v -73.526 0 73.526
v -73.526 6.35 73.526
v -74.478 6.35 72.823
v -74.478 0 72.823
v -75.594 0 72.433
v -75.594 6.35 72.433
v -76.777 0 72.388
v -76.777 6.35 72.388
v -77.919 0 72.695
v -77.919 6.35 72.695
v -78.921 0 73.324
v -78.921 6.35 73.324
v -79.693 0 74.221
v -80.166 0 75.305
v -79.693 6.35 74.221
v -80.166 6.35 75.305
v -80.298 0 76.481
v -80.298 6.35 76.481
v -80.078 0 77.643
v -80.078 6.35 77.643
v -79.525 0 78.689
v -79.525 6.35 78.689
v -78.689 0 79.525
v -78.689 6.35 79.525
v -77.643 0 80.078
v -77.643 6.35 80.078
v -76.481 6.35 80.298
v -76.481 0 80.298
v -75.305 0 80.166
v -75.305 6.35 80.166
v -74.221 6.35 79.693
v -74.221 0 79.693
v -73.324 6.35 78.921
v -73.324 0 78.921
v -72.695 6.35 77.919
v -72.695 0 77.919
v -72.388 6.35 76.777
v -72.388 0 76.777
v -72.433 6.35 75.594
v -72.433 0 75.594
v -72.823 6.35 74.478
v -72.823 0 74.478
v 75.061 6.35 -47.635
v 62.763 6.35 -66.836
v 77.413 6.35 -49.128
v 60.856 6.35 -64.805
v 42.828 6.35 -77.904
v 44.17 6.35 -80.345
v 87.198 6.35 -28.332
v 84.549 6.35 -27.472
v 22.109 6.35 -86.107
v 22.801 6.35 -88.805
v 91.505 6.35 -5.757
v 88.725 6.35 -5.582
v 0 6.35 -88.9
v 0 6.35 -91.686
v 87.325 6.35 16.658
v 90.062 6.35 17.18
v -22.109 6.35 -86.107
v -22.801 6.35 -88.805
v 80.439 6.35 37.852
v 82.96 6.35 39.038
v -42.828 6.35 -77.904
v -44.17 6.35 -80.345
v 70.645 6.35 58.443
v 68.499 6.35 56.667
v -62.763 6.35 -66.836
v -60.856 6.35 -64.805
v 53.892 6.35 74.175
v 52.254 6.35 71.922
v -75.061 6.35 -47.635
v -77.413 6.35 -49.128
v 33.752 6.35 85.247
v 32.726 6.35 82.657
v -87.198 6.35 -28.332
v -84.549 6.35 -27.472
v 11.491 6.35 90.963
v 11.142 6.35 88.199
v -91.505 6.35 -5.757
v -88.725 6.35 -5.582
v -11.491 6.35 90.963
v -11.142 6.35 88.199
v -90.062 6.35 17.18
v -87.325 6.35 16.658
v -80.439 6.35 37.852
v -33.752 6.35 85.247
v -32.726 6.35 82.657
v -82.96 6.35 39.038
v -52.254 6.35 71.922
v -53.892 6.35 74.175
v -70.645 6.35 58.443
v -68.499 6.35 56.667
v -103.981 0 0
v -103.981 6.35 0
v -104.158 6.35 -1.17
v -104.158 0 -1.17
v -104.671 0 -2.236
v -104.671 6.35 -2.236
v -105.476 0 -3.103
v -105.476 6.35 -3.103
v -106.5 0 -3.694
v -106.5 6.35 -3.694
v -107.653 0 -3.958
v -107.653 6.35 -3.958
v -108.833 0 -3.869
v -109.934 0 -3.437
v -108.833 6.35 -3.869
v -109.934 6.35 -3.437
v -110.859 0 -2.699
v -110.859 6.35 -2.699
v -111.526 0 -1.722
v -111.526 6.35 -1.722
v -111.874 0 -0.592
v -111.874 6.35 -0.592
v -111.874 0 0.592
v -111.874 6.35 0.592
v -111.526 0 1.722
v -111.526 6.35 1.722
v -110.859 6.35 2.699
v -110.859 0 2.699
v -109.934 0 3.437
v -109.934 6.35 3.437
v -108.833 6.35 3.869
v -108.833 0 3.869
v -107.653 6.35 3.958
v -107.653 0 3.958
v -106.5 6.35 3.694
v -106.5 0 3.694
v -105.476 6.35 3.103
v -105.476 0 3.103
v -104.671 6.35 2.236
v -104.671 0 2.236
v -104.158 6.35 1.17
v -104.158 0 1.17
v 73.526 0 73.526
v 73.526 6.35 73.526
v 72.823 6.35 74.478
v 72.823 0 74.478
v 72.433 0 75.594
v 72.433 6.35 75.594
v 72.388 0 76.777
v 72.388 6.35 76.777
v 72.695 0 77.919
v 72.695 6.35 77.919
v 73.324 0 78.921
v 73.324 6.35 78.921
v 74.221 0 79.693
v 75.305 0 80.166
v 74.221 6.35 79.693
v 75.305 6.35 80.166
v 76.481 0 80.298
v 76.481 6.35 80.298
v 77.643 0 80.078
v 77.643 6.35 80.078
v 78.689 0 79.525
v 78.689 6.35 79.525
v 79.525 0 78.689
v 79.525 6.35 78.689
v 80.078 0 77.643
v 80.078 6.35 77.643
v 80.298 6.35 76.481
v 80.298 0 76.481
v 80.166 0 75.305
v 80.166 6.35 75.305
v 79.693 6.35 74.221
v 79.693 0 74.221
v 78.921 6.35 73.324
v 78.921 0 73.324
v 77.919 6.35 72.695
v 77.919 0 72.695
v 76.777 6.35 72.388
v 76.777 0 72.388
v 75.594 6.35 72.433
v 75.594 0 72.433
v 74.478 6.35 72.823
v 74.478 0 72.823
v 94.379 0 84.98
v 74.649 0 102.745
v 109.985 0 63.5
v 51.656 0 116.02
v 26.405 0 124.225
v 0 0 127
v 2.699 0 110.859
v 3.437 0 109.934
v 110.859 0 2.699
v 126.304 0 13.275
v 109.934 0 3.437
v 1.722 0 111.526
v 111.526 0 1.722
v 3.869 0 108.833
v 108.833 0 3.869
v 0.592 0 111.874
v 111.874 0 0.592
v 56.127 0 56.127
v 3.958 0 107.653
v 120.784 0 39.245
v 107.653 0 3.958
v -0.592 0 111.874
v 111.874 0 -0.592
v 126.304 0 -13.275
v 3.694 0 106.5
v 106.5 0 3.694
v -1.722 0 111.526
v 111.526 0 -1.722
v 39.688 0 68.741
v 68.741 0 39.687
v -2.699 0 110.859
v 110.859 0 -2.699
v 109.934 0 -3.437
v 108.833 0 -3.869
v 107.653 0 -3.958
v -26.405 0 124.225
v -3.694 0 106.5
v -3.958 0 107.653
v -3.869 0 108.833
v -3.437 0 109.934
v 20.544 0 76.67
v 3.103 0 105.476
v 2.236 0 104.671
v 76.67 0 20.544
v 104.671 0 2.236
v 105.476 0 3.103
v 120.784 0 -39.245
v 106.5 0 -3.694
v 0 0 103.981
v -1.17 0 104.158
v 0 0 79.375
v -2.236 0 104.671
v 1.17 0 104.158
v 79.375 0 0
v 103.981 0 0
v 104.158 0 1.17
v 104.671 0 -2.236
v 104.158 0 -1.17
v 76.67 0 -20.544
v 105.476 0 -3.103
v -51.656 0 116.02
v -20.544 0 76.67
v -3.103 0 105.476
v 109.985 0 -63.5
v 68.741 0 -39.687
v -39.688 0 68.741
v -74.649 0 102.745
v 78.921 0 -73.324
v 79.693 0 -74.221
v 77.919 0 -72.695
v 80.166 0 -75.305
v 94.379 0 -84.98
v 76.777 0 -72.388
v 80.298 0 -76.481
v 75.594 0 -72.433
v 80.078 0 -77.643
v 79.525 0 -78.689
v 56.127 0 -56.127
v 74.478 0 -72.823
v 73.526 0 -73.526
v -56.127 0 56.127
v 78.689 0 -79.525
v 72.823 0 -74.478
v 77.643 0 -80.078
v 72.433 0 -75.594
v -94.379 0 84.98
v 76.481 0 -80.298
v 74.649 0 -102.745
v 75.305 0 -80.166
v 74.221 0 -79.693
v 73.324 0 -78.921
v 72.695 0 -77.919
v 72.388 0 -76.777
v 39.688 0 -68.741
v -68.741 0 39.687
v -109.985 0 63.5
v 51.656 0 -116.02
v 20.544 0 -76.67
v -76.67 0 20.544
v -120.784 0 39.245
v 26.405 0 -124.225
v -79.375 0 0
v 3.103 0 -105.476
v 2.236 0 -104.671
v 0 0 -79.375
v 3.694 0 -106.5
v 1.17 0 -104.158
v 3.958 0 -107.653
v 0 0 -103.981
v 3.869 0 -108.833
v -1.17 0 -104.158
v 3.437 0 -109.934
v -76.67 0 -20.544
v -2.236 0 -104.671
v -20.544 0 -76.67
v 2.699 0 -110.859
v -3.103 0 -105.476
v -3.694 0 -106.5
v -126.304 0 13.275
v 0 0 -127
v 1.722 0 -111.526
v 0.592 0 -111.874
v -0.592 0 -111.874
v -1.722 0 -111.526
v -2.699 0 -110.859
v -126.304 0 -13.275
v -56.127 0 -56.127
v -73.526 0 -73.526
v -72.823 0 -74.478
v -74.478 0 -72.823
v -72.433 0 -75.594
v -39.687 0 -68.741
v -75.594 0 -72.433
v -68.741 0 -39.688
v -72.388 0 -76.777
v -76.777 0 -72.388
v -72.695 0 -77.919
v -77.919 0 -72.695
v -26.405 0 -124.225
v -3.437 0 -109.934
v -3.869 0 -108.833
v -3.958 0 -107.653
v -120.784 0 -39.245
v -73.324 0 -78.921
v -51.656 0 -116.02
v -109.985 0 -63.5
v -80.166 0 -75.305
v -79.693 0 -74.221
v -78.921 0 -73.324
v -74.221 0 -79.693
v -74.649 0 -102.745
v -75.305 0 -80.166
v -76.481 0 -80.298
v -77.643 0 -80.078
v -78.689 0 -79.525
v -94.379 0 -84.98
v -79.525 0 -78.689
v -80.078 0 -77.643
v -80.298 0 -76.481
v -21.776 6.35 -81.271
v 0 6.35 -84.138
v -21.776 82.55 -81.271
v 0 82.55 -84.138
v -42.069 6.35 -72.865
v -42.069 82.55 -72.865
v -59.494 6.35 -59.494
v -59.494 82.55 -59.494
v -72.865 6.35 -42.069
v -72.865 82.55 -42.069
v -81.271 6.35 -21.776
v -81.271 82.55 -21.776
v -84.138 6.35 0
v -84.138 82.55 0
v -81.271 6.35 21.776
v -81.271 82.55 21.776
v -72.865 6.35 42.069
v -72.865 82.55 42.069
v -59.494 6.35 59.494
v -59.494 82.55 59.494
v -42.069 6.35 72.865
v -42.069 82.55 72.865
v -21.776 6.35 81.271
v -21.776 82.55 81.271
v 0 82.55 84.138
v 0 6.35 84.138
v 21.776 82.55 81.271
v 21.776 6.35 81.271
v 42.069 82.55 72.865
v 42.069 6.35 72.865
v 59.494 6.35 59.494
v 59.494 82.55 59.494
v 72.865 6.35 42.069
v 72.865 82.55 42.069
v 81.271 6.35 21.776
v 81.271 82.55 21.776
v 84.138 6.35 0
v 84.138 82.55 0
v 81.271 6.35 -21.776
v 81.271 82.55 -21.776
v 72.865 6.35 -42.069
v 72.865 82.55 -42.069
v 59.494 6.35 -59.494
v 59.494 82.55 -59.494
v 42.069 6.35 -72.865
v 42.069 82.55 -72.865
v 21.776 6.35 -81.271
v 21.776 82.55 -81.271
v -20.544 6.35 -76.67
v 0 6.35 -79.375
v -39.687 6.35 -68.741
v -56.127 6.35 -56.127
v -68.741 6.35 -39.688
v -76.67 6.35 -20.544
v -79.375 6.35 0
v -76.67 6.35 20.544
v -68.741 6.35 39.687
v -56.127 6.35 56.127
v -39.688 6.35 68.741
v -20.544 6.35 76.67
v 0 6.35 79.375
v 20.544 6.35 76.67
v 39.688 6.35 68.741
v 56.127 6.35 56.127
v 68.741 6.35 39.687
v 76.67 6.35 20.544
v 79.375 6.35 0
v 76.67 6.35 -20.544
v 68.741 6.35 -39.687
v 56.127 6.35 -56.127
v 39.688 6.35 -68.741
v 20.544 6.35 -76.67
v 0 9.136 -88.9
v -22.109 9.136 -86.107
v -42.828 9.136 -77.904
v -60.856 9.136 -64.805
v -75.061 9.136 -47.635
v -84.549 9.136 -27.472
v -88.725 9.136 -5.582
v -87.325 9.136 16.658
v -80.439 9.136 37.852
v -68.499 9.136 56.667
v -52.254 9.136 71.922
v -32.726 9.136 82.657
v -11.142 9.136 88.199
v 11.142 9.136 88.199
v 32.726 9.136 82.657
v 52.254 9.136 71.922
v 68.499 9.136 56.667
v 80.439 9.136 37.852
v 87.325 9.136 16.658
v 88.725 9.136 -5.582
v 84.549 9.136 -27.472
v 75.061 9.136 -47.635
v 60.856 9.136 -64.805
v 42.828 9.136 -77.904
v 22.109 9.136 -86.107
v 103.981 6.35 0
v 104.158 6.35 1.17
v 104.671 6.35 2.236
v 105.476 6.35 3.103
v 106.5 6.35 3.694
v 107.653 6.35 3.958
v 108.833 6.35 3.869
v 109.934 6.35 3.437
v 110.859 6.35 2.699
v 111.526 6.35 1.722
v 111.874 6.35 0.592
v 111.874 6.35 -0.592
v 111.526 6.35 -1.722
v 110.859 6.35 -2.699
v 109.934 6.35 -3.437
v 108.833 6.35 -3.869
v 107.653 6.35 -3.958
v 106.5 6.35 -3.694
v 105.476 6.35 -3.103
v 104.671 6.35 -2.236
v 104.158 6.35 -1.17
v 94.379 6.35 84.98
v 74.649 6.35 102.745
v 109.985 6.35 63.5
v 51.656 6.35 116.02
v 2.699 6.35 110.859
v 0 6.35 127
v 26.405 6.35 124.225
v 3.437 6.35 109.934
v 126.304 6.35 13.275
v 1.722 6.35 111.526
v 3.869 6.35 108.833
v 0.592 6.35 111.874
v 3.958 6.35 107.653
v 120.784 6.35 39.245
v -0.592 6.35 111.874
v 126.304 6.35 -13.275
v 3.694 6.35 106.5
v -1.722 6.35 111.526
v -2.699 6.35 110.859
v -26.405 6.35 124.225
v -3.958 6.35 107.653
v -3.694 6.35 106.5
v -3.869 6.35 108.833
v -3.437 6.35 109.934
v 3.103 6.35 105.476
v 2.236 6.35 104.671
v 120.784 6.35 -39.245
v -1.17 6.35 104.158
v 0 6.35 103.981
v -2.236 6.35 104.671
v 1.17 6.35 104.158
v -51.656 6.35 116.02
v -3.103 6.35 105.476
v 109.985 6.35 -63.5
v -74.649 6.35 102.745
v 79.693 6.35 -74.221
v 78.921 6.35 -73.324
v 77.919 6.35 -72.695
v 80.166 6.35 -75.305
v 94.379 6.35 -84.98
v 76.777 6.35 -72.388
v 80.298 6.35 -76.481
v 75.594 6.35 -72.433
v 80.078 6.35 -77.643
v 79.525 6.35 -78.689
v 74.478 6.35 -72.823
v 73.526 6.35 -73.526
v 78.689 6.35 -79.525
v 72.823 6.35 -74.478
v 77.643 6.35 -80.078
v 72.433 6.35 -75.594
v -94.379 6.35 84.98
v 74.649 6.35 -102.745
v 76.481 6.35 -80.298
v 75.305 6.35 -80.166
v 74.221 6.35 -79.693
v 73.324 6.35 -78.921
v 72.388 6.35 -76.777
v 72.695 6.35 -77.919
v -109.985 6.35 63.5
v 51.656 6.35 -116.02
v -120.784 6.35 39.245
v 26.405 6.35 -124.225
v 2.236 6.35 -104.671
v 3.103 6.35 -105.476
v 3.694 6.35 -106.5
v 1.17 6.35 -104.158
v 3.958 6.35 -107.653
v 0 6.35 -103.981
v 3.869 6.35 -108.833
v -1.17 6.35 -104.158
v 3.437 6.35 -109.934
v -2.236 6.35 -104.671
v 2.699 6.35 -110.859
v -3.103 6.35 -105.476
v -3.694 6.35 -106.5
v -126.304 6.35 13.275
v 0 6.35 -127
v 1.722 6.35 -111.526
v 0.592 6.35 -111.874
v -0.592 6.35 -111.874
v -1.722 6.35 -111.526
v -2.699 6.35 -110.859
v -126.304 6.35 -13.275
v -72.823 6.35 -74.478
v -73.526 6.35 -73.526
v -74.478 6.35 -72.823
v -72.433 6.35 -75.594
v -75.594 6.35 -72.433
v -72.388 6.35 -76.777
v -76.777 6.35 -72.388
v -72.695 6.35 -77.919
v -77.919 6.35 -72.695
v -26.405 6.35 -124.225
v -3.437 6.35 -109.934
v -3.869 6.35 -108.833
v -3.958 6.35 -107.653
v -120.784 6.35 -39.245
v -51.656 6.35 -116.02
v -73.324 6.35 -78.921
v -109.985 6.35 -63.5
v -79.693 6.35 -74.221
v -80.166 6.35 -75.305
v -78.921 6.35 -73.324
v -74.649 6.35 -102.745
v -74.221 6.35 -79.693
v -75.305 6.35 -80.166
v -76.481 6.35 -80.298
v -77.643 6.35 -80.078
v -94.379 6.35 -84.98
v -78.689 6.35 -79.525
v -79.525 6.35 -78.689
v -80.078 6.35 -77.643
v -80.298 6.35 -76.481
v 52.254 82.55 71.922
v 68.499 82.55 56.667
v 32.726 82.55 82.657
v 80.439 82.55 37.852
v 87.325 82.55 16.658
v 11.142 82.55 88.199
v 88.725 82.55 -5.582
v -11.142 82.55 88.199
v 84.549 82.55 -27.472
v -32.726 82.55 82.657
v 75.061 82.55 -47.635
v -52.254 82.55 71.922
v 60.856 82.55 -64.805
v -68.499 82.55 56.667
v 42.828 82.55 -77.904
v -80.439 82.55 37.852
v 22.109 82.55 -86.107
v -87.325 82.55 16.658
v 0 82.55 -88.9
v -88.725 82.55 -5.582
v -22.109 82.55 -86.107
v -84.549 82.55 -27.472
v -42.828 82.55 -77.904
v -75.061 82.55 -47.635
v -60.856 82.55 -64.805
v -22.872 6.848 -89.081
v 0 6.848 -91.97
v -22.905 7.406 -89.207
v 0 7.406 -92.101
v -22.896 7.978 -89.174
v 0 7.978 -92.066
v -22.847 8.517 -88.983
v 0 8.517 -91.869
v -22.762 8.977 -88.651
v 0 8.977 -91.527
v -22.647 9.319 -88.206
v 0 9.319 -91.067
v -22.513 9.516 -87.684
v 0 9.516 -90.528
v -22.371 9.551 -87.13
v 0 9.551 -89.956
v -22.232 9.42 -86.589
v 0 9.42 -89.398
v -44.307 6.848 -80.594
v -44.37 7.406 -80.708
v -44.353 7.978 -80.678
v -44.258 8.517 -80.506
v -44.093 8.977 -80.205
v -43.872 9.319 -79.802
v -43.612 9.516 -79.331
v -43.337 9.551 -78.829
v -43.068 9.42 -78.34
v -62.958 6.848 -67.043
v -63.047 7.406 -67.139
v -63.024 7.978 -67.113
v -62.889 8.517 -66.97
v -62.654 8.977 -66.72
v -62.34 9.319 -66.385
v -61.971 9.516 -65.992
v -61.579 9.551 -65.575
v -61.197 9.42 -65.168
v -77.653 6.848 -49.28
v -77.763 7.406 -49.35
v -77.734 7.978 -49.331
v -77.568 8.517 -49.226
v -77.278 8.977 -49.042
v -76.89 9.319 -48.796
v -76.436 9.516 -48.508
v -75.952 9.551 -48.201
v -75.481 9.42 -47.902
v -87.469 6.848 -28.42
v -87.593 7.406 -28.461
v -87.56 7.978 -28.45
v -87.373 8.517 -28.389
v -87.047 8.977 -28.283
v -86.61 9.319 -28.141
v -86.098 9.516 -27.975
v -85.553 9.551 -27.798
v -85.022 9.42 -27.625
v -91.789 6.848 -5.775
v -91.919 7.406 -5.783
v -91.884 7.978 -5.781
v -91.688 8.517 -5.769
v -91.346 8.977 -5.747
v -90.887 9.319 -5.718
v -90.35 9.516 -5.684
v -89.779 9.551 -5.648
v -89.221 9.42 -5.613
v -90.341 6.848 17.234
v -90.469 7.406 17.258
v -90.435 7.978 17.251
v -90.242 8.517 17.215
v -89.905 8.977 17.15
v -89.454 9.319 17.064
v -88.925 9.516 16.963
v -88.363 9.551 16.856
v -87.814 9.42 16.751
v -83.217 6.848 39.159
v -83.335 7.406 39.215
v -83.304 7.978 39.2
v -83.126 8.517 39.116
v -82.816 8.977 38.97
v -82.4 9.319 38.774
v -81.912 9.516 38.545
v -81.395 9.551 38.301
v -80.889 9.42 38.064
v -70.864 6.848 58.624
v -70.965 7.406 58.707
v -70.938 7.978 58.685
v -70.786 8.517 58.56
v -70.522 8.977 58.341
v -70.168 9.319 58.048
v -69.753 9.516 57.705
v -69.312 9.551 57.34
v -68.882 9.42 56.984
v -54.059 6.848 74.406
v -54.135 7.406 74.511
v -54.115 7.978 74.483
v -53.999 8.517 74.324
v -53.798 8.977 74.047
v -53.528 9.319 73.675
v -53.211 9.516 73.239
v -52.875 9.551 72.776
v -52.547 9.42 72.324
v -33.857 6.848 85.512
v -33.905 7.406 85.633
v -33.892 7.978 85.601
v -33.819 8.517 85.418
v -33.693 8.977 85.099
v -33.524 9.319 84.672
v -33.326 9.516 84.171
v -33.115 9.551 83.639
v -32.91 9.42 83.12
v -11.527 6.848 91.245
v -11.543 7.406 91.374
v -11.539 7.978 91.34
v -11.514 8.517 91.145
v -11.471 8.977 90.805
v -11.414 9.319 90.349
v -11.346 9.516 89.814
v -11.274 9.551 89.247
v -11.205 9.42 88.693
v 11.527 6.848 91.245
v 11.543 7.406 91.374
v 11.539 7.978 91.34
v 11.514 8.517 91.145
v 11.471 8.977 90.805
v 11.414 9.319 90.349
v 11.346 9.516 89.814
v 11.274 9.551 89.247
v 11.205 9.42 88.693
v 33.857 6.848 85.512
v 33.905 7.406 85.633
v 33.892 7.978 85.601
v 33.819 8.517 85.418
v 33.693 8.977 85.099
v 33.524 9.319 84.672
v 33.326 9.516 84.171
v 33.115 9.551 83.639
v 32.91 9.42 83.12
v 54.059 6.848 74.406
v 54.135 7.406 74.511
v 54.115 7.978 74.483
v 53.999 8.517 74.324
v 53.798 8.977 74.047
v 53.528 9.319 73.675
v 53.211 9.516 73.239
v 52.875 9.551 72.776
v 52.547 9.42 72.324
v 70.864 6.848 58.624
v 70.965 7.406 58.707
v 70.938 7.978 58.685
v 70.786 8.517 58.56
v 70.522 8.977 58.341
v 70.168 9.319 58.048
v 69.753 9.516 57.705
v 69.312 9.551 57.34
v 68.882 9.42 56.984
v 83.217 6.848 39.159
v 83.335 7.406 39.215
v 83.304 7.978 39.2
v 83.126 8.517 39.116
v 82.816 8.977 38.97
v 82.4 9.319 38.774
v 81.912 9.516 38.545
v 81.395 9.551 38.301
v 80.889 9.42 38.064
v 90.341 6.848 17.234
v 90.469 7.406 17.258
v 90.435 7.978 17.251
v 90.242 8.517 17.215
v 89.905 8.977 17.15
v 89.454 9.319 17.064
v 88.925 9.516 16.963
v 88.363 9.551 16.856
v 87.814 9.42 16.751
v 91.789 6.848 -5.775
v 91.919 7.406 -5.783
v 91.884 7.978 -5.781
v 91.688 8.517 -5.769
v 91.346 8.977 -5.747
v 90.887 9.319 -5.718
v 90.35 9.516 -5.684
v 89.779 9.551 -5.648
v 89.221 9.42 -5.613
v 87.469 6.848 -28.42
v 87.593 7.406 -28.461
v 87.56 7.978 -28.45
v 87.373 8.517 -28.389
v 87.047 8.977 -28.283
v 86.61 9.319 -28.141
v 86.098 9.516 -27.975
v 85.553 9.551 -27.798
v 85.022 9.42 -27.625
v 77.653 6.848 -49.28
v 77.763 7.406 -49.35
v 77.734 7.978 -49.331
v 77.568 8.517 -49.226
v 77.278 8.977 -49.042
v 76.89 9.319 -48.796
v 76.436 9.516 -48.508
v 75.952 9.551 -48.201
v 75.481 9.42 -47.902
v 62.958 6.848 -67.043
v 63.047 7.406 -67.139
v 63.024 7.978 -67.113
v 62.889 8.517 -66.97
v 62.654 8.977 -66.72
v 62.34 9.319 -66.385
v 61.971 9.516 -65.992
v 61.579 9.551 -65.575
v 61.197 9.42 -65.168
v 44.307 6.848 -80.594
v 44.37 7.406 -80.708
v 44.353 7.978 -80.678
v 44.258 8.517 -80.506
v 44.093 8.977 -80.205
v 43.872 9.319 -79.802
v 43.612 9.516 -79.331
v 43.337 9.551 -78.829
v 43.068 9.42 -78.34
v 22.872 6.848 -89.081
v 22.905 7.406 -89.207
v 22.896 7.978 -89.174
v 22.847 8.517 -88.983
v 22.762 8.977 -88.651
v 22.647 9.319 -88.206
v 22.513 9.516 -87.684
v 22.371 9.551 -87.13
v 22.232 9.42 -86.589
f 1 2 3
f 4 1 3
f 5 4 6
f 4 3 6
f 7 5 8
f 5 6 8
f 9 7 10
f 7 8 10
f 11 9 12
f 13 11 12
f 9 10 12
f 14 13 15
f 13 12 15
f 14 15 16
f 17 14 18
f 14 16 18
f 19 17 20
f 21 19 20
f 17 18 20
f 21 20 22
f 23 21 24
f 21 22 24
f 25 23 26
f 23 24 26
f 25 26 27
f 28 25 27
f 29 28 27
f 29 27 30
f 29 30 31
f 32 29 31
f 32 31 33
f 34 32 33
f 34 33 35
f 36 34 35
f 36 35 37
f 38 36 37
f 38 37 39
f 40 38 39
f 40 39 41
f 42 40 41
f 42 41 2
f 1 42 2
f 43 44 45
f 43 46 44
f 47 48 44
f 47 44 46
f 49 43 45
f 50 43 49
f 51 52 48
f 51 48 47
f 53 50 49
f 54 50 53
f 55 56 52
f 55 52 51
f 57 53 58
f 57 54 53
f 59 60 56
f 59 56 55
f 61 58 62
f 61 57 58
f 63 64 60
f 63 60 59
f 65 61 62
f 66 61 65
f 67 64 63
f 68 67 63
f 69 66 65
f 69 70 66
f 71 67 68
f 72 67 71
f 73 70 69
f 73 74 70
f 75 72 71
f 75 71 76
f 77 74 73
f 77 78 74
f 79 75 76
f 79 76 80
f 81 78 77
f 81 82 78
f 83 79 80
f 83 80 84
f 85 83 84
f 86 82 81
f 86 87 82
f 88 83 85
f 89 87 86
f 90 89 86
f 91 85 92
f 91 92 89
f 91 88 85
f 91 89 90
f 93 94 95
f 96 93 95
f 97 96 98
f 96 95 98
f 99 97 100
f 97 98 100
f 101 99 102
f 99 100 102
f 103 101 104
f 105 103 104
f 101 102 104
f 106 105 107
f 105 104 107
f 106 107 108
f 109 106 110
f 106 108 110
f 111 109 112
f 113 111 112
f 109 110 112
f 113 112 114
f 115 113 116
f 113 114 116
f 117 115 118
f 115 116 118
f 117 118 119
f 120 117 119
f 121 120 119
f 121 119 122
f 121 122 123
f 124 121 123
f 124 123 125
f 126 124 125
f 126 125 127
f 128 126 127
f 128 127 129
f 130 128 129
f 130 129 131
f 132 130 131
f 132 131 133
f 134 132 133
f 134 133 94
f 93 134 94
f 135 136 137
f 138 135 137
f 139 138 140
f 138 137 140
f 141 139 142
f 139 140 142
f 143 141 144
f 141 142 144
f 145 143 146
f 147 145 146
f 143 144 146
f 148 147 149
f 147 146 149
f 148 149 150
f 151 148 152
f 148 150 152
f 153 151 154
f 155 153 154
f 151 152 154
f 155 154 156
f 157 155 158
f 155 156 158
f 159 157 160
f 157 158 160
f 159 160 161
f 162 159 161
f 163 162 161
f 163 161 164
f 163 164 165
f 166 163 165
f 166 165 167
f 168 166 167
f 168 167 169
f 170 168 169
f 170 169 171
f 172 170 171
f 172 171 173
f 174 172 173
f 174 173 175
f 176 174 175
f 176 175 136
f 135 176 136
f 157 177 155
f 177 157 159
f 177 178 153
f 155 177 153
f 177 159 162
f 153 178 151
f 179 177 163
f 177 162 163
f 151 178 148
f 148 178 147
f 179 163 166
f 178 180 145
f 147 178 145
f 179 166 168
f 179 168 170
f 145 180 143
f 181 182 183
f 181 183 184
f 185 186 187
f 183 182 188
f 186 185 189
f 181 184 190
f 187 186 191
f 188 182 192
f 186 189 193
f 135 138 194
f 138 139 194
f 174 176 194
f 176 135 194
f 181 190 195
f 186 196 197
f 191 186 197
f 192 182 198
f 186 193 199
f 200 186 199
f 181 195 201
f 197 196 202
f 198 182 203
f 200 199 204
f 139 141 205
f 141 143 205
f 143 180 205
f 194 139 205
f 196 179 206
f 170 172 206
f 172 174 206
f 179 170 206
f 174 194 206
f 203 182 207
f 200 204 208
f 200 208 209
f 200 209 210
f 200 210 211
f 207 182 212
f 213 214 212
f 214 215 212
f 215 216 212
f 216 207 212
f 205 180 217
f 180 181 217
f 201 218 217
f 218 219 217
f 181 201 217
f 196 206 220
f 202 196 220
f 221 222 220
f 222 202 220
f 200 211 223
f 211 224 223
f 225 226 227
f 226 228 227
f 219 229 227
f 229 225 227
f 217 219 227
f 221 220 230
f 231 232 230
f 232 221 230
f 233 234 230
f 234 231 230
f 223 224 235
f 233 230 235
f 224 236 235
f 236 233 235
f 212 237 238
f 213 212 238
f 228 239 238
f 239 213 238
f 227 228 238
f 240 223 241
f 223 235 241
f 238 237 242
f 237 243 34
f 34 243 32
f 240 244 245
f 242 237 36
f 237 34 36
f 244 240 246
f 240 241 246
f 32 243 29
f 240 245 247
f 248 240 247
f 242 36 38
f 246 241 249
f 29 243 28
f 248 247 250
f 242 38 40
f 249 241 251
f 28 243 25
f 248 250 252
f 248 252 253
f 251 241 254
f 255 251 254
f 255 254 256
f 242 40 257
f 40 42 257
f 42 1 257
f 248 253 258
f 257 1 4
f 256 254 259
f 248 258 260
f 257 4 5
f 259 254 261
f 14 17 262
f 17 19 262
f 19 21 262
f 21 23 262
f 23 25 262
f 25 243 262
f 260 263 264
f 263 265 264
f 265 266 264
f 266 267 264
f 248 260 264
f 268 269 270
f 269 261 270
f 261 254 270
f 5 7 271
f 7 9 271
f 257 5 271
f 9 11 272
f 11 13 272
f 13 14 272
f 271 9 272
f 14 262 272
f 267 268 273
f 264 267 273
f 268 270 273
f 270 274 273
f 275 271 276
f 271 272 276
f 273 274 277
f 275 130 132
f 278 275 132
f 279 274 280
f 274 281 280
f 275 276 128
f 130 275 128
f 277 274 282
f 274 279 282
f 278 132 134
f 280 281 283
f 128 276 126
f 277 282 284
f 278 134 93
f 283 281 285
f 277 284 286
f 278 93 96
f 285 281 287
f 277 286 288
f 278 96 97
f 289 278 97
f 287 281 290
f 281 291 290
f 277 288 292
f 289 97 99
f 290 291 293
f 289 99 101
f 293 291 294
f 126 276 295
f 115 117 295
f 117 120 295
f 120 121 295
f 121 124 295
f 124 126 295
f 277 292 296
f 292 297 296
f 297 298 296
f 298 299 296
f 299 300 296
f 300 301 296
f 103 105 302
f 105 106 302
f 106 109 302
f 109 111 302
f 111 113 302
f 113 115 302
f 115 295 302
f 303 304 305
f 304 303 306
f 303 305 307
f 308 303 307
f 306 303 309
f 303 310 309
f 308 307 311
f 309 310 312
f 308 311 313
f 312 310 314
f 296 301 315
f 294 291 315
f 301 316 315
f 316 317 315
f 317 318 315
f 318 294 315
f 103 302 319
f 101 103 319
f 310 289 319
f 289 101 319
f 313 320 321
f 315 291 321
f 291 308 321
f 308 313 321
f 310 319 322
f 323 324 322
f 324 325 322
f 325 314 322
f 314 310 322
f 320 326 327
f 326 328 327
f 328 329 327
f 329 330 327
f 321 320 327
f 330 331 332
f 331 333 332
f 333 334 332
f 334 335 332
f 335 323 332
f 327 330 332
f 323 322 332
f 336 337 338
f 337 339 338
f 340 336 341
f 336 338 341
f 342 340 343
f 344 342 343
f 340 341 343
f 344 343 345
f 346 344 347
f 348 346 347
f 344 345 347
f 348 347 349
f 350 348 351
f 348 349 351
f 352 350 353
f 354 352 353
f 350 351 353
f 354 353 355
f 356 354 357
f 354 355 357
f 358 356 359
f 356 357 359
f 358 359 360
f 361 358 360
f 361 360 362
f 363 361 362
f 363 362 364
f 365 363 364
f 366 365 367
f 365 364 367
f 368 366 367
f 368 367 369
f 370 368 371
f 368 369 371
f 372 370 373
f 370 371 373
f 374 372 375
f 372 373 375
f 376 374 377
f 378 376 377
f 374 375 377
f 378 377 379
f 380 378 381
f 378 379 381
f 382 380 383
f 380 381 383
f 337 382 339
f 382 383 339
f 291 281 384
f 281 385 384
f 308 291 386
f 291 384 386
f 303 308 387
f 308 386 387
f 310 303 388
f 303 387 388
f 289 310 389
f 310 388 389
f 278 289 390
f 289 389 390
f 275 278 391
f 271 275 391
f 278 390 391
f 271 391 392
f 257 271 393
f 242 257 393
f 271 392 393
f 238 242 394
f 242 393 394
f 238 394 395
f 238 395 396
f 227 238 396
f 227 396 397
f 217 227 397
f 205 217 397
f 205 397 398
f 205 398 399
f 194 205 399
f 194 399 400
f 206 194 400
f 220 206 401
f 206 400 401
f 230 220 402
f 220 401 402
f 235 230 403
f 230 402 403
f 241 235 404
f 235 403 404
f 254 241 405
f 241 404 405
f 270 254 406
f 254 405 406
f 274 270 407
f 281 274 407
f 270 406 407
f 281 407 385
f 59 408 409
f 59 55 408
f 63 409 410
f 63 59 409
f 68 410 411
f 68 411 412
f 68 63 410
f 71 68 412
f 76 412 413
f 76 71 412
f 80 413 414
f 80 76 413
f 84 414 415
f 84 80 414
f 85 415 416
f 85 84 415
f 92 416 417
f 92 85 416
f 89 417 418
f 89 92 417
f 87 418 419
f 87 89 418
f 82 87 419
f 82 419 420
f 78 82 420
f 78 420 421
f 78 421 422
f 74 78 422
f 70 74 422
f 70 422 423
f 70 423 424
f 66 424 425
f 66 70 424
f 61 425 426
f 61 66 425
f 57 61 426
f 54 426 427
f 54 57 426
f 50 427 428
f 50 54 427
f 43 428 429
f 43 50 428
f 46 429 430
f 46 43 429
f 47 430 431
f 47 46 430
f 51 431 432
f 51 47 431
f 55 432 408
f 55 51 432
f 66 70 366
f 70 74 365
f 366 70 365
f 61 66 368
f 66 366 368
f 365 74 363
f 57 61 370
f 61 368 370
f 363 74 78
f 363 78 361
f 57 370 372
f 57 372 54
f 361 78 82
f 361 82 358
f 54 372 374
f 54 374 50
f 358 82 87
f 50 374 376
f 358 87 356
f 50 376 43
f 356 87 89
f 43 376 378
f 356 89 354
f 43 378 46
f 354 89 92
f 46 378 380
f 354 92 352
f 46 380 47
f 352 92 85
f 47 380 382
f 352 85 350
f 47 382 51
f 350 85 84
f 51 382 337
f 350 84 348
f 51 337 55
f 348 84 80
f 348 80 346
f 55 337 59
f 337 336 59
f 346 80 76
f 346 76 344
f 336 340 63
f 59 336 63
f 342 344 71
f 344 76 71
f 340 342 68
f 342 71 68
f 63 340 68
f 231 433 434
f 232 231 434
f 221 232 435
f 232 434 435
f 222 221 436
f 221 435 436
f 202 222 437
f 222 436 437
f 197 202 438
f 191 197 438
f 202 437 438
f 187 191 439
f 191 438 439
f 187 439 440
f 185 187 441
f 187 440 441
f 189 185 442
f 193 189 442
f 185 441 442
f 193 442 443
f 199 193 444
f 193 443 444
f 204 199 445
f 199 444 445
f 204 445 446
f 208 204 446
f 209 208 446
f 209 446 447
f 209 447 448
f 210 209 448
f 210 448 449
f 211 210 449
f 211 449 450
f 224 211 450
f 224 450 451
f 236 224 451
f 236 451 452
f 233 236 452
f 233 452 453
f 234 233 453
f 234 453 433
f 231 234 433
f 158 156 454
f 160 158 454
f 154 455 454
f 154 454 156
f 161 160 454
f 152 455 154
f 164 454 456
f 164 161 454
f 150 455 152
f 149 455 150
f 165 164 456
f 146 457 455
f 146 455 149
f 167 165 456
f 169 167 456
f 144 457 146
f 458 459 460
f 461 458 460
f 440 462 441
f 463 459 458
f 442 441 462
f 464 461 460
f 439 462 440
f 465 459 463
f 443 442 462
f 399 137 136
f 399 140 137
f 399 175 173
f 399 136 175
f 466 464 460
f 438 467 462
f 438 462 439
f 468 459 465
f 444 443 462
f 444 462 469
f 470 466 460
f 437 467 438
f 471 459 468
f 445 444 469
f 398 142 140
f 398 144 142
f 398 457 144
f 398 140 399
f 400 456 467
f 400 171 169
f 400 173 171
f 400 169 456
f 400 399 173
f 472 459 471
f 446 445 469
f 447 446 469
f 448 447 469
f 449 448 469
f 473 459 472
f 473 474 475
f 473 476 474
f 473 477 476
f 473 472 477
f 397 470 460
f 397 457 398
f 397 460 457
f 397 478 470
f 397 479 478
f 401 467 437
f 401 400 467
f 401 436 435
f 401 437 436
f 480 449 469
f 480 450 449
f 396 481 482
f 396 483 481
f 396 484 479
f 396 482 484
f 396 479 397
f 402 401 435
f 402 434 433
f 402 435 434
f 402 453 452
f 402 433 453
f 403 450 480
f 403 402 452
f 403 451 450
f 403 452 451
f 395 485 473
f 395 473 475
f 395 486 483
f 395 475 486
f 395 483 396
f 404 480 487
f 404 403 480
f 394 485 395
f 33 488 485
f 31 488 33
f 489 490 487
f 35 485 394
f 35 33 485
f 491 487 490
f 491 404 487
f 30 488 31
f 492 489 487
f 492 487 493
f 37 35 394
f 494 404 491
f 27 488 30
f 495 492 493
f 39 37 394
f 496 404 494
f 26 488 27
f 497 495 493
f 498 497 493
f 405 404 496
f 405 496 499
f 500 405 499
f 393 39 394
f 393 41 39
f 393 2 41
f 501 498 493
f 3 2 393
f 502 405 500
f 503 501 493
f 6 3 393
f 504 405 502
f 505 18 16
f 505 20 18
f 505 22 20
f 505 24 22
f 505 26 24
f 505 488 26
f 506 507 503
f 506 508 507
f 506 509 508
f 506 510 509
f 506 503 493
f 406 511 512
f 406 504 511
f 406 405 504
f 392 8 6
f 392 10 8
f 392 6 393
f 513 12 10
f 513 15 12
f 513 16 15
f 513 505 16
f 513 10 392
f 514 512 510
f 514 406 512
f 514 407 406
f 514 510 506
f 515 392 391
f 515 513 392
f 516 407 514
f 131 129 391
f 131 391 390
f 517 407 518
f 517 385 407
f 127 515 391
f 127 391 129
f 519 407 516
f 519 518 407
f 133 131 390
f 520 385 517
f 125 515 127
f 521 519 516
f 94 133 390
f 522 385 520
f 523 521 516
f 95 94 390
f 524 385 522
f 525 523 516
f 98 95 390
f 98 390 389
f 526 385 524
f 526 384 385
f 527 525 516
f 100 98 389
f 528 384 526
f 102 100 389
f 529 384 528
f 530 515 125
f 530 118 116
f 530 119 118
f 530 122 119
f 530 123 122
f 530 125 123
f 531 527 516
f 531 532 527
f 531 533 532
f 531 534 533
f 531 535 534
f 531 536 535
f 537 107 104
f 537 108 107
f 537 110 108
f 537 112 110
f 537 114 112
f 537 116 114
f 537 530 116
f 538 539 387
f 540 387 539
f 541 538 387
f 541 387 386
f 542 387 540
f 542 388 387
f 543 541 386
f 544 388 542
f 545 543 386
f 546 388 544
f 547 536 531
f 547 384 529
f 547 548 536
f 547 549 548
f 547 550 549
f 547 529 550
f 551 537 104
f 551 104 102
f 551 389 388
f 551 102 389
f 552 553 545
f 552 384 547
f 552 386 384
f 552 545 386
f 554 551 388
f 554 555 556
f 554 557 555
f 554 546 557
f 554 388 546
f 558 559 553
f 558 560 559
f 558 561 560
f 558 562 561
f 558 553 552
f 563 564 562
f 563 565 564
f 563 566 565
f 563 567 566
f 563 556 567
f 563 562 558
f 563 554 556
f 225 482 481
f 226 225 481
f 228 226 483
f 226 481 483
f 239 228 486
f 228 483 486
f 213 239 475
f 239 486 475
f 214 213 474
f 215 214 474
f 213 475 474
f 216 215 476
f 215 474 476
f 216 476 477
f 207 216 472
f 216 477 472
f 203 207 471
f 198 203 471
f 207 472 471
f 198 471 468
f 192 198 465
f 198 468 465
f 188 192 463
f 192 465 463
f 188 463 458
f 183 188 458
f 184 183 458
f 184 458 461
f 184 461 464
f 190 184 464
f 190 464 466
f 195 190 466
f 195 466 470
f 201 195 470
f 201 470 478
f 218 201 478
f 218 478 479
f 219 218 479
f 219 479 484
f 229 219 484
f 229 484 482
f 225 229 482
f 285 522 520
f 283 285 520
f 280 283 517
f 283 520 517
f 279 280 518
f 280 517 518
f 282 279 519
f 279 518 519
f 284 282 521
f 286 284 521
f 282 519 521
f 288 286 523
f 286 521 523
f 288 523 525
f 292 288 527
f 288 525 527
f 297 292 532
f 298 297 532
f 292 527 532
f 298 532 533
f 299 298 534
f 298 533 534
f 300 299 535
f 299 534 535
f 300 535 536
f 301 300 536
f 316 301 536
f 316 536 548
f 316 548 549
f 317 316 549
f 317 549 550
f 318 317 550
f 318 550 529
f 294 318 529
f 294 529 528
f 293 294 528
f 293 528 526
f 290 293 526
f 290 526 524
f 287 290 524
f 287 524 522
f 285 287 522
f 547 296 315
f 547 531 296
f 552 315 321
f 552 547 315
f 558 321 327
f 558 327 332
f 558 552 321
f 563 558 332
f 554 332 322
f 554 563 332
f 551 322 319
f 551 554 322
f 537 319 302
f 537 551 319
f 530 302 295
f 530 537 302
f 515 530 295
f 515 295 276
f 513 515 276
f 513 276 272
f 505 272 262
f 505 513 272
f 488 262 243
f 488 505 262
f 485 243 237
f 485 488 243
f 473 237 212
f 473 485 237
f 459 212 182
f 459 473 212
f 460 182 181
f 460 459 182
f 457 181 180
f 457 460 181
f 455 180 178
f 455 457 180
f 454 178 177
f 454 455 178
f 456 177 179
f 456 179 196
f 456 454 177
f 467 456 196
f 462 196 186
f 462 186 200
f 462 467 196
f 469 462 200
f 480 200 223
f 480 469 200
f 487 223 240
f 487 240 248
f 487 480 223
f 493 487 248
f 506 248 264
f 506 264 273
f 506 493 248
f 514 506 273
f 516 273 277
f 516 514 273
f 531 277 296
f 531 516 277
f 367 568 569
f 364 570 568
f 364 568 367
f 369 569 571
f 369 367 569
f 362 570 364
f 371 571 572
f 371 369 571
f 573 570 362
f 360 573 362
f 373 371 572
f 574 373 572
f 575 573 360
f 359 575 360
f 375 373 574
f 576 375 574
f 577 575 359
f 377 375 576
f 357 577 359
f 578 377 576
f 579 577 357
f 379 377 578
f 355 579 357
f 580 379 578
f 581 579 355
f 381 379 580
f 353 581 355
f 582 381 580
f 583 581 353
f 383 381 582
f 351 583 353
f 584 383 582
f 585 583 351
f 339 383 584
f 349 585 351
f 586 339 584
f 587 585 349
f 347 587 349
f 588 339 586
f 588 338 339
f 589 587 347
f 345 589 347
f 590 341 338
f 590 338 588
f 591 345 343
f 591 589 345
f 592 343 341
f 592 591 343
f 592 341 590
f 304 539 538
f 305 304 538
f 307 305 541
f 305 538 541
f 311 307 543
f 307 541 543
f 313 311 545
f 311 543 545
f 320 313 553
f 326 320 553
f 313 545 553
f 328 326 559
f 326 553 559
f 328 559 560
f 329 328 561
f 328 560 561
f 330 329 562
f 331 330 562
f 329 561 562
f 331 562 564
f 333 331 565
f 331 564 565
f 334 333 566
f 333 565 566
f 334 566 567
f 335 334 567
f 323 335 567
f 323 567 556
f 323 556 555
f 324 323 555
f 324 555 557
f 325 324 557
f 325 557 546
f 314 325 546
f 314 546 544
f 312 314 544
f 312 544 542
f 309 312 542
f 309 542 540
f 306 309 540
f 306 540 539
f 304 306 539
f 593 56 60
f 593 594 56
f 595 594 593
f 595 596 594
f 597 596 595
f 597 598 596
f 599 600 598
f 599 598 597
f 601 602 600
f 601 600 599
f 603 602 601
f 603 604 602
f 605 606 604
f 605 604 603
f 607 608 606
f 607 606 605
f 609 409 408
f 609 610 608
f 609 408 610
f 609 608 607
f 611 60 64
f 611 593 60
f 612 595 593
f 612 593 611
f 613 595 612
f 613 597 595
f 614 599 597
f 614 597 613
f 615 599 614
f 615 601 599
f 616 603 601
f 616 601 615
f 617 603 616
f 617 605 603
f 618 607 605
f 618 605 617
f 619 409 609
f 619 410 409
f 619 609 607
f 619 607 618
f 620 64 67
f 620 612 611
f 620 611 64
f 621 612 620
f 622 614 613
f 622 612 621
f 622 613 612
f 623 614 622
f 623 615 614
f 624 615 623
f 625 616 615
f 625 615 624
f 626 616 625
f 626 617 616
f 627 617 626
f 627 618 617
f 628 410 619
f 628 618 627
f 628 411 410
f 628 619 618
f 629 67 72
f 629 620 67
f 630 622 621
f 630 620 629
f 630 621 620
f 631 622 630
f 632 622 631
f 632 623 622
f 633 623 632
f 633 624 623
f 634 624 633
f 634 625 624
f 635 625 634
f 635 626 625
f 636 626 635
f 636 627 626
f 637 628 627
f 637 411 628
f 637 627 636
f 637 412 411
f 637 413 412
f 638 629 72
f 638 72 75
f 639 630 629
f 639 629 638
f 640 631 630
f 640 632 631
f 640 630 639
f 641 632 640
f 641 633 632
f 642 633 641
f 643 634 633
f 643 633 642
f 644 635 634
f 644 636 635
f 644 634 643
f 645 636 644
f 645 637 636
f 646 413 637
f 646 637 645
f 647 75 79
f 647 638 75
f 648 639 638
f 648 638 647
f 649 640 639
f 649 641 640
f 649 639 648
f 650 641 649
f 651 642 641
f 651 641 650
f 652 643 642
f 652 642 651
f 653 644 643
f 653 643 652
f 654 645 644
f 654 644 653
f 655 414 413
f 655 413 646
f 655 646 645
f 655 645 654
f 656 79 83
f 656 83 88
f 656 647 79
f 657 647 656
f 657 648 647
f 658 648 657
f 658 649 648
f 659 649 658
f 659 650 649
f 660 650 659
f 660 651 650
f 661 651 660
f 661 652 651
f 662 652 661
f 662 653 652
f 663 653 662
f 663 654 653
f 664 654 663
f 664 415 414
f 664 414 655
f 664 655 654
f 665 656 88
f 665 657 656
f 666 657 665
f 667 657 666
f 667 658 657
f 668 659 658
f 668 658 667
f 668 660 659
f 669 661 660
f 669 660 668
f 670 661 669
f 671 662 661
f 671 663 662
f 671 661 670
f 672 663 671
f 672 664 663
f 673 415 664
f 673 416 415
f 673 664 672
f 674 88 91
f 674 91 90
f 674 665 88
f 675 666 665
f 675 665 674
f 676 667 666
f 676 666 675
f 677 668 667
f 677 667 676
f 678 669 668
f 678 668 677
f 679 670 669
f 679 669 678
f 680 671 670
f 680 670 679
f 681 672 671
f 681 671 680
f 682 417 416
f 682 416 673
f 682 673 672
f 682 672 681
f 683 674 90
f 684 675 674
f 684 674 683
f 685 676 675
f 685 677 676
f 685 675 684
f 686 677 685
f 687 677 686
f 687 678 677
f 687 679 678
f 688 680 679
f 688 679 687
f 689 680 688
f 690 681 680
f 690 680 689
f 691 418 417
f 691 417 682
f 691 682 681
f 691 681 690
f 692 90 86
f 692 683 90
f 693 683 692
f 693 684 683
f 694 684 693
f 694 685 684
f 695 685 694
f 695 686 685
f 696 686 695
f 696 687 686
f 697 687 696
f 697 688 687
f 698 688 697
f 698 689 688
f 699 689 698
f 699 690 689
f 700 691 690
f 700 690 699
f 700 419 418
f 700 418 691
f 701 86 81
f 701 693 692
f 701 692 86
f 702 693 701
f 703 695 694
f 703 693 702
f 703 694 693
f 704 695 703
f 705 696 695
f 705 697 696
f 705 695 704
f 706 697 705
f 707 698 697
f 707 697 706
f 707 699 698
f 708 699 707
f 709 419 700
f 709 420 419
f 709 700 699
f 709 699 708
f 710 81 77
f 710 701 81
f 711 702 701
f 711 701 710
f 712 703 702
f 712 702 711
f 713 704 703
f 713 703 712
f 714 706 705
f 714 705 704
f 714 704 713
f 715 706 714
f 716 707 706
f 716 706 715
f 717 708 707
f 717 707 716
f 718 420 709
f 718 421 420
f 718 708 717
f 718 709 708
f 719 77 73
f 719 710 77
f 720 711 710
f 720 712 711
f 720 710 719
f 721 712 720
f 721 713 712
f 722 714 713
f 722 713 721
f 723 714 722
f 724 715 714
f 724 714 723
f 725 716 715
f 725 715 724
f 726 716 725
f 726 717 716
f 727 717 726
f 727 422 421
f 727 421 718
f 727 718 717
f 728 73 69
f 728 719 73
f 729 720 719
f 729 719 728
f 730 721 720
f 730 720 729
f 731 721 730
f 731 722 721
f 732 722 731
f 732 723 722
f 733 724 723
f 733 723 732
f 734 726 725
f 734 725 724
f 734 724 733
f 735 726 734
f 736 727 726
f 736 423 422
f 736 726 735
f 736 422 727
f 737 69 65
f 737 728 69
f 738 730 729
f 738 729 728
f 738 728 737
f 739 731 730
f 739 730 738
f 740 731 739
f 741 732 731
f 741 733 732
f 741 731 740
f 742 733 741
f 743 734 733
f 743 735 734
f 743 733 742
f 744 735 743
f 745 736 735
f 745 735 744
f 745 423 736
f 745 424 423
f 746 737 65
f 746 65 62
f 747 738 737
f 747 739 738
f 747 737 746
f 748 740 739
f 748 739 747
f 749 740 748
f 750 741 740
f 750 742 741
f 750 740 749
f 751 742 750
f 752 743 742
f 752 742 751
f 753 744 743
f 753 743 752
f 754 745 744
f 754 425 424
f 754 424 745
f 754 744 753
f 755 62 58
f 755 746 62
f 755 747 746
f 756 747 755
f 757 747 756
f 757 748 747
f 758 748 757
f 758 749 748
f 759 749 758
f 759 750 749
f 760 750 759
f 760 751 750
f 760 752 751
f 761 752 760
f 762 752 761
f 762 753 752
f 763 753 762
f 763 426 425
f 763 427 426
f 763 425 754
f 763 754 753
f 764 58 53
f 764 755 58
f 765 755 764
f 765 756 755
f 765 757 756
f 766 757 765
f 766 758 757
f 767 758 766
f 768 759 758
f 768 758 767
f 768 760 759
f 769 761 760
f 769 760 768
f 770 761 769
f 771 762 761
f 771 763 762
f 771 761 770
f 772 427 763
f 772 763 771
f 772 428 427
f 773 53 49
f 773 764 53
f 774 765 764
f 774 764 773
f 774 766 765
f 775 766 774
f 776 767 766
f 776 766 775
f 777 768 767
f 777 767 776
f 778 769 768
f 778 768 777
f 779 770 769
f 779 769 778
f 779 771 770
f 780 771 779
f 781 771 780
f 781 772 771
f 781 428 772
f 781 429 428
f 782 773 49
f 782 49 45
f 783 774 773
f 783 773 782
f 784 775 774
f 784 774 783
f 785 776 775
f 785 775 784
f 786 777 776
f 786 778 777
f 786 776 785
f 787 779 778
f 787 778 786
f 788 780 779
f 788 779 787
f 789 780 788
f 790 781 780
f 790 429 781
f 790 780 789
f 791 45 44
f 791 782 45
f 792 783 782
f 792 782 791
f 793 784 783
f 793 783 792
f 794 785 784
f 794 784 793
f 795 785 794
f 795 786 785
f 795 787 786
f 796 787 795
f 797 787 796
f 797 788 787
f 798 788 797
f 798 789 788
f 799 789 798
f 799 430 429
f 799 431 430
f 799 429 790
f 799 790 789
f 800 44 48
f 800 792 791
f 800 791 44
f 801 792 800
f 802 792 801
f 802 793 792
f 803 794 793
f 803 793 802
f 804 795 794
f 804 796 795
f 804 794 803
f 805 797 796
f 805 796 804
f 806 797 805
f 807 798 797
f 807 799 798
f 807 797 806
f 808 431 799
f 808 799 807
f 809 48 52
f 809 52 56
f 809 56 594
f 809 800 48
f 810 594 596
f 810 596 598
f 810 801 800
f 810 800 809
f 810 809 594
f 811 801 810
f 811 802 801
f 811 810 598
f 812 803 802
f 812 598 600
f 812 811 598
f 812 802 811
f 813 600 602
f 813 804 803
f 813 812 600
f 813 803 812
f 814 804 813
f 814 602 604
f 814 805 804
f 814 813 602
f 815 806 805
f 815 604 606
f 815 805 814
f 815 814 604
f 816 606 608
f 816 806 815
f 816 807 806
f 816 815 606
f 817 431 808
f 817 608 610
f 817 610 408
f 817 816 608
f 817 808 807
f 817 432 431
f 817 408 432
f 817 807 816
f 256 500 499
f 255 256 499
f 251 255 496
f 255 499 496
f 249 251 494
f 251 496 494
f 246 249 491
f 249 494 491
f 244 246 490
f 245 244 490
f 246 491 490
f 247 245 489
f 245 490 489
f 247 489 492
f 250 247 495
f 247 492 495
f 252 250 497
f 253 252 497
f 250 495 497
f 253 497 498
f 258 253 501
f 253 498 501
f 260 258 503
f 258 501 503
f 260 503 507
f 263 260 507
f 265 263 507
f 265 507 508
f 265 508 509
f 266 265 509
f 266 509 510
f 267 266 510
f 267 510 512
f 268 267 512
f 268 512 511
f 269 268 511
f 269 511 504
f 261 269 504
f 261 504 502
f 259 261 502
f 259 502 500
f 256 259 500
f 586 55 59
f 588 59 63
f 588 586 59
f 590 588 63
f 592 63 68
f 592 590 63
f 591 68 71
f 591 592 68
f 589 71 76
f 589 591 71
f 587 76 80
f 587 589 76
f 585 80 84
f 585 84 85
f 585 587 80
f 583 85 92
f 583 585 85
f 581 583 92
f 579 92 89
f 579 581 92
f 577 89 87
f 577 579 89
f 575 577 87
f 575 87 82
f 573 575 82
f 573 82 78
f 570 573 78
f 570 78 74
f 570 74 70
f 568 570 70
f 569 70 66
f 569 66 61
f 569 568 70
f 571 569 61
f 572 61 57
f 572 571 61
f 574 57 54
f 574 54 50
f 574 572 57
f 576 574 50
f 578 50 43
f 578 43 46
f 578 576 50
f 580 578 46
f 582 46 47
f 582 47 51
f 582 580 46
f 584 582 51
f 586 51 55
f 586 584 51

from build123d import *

# Parameters (mm, degrees)
SKETCH1_W          = 47.625
SKETCH1_H          = 6.35
SKETCH2_W          = 4.7625
SKETCH2_H          = 76.2
SKETCH4_R          = 3.96875
CUT_EXTRUDE1_DEPTH = 7.35
CIRPATTERN1_COUNT  = 8


with BuildPart() as part:
    # Sketch1 → Revolve1 (revolve)
    with BuildSketch(Plane.XY, mode=Mode.PRIVATE) as revolve1_sk:
        with Locations((-103.1875, 3.175)):
            Rectangle(SKETCH1_W, SKETCH1_H)
    revolve(revolve1_sk.sketch.rotate(Axis((0, 0, 0), (0, 1, 0)), 270), axis=Axis((0, 0, 0), (0, 1, 0)))  # turned: the seam where the file's is

    # Sketch4 → Cut-Extrude1 (cut, through all)
    with BuildSketch(Plane(origin=(0, 6.35, 0), x_dir=(1, 0, 0), z_dir=(0, 1, 0))):
        with Locations(Location((0, 107.95, 0), (0, 0, 270))):  # turned: the seam where the file's is
            Circle(SKETCH4_R)
    cut_extrude1 = extrude(amount=-CUT_EXTRUDE1_DEPTH, mode=Mode.SUBTRACT)

    # CirPattern1: Cut-Extrude1 ×8 about axis
    cirpattern1_axis = Axis((0, 0, 0), (0, 1, 0))
    for i in range(1, CIRPATTERN1_COUNT):
        add(cut_extrude1.rotate(cirpattern1_axis, i * 360 / CIRPATTERN1_COUNT), mode=Mode.SUBTRACT)


with BuildPart() as body_2:
    # Sketch2 → Revolve2 (revolve)
    with BuildSketch(Plane.XY, mode=Mode.PRIVATE) as revolve2_sk:
        with Locations((-86.51875, 44.45)):
            Rectangle(SKETCH2_W, SKETCH2_H)
    revolve(revolve2_sk.sketch.rotate(Axis((0, 0, 0), (0, 1, 0)), 270), axis=Axis((0, 0, 0), (0, 1, 0)))  # turned: the seam where the file's is


with BuildPart() as body_3:
    # Sketch3 → Revolve3 (revolve)
    with BuildSketch(Plane.XY, mode=Mode.PRIVATE) as revolve3_sk:
        with BuildLine():
            Line((-88.9, 6.35), (-91.685775819, 6.35))
            ThreePointArc((-91.685775819, 6.35), (-91.526537909, 8.976537909), (-88.9, 9.135775819))
            Line((-88.9, 9.135775819), (-88.9, 6.35))
        make_face()
    revolve(revolve3_sk.sketch.rotate(Axis((0, 0, 0), (0, 1, 0)), 270), axis=Axis((0, 0, 0), (0, 1, 0)))  # turned: the seam where the file's is


solid = Compound([part.part, body_2.part, body_3.part])
